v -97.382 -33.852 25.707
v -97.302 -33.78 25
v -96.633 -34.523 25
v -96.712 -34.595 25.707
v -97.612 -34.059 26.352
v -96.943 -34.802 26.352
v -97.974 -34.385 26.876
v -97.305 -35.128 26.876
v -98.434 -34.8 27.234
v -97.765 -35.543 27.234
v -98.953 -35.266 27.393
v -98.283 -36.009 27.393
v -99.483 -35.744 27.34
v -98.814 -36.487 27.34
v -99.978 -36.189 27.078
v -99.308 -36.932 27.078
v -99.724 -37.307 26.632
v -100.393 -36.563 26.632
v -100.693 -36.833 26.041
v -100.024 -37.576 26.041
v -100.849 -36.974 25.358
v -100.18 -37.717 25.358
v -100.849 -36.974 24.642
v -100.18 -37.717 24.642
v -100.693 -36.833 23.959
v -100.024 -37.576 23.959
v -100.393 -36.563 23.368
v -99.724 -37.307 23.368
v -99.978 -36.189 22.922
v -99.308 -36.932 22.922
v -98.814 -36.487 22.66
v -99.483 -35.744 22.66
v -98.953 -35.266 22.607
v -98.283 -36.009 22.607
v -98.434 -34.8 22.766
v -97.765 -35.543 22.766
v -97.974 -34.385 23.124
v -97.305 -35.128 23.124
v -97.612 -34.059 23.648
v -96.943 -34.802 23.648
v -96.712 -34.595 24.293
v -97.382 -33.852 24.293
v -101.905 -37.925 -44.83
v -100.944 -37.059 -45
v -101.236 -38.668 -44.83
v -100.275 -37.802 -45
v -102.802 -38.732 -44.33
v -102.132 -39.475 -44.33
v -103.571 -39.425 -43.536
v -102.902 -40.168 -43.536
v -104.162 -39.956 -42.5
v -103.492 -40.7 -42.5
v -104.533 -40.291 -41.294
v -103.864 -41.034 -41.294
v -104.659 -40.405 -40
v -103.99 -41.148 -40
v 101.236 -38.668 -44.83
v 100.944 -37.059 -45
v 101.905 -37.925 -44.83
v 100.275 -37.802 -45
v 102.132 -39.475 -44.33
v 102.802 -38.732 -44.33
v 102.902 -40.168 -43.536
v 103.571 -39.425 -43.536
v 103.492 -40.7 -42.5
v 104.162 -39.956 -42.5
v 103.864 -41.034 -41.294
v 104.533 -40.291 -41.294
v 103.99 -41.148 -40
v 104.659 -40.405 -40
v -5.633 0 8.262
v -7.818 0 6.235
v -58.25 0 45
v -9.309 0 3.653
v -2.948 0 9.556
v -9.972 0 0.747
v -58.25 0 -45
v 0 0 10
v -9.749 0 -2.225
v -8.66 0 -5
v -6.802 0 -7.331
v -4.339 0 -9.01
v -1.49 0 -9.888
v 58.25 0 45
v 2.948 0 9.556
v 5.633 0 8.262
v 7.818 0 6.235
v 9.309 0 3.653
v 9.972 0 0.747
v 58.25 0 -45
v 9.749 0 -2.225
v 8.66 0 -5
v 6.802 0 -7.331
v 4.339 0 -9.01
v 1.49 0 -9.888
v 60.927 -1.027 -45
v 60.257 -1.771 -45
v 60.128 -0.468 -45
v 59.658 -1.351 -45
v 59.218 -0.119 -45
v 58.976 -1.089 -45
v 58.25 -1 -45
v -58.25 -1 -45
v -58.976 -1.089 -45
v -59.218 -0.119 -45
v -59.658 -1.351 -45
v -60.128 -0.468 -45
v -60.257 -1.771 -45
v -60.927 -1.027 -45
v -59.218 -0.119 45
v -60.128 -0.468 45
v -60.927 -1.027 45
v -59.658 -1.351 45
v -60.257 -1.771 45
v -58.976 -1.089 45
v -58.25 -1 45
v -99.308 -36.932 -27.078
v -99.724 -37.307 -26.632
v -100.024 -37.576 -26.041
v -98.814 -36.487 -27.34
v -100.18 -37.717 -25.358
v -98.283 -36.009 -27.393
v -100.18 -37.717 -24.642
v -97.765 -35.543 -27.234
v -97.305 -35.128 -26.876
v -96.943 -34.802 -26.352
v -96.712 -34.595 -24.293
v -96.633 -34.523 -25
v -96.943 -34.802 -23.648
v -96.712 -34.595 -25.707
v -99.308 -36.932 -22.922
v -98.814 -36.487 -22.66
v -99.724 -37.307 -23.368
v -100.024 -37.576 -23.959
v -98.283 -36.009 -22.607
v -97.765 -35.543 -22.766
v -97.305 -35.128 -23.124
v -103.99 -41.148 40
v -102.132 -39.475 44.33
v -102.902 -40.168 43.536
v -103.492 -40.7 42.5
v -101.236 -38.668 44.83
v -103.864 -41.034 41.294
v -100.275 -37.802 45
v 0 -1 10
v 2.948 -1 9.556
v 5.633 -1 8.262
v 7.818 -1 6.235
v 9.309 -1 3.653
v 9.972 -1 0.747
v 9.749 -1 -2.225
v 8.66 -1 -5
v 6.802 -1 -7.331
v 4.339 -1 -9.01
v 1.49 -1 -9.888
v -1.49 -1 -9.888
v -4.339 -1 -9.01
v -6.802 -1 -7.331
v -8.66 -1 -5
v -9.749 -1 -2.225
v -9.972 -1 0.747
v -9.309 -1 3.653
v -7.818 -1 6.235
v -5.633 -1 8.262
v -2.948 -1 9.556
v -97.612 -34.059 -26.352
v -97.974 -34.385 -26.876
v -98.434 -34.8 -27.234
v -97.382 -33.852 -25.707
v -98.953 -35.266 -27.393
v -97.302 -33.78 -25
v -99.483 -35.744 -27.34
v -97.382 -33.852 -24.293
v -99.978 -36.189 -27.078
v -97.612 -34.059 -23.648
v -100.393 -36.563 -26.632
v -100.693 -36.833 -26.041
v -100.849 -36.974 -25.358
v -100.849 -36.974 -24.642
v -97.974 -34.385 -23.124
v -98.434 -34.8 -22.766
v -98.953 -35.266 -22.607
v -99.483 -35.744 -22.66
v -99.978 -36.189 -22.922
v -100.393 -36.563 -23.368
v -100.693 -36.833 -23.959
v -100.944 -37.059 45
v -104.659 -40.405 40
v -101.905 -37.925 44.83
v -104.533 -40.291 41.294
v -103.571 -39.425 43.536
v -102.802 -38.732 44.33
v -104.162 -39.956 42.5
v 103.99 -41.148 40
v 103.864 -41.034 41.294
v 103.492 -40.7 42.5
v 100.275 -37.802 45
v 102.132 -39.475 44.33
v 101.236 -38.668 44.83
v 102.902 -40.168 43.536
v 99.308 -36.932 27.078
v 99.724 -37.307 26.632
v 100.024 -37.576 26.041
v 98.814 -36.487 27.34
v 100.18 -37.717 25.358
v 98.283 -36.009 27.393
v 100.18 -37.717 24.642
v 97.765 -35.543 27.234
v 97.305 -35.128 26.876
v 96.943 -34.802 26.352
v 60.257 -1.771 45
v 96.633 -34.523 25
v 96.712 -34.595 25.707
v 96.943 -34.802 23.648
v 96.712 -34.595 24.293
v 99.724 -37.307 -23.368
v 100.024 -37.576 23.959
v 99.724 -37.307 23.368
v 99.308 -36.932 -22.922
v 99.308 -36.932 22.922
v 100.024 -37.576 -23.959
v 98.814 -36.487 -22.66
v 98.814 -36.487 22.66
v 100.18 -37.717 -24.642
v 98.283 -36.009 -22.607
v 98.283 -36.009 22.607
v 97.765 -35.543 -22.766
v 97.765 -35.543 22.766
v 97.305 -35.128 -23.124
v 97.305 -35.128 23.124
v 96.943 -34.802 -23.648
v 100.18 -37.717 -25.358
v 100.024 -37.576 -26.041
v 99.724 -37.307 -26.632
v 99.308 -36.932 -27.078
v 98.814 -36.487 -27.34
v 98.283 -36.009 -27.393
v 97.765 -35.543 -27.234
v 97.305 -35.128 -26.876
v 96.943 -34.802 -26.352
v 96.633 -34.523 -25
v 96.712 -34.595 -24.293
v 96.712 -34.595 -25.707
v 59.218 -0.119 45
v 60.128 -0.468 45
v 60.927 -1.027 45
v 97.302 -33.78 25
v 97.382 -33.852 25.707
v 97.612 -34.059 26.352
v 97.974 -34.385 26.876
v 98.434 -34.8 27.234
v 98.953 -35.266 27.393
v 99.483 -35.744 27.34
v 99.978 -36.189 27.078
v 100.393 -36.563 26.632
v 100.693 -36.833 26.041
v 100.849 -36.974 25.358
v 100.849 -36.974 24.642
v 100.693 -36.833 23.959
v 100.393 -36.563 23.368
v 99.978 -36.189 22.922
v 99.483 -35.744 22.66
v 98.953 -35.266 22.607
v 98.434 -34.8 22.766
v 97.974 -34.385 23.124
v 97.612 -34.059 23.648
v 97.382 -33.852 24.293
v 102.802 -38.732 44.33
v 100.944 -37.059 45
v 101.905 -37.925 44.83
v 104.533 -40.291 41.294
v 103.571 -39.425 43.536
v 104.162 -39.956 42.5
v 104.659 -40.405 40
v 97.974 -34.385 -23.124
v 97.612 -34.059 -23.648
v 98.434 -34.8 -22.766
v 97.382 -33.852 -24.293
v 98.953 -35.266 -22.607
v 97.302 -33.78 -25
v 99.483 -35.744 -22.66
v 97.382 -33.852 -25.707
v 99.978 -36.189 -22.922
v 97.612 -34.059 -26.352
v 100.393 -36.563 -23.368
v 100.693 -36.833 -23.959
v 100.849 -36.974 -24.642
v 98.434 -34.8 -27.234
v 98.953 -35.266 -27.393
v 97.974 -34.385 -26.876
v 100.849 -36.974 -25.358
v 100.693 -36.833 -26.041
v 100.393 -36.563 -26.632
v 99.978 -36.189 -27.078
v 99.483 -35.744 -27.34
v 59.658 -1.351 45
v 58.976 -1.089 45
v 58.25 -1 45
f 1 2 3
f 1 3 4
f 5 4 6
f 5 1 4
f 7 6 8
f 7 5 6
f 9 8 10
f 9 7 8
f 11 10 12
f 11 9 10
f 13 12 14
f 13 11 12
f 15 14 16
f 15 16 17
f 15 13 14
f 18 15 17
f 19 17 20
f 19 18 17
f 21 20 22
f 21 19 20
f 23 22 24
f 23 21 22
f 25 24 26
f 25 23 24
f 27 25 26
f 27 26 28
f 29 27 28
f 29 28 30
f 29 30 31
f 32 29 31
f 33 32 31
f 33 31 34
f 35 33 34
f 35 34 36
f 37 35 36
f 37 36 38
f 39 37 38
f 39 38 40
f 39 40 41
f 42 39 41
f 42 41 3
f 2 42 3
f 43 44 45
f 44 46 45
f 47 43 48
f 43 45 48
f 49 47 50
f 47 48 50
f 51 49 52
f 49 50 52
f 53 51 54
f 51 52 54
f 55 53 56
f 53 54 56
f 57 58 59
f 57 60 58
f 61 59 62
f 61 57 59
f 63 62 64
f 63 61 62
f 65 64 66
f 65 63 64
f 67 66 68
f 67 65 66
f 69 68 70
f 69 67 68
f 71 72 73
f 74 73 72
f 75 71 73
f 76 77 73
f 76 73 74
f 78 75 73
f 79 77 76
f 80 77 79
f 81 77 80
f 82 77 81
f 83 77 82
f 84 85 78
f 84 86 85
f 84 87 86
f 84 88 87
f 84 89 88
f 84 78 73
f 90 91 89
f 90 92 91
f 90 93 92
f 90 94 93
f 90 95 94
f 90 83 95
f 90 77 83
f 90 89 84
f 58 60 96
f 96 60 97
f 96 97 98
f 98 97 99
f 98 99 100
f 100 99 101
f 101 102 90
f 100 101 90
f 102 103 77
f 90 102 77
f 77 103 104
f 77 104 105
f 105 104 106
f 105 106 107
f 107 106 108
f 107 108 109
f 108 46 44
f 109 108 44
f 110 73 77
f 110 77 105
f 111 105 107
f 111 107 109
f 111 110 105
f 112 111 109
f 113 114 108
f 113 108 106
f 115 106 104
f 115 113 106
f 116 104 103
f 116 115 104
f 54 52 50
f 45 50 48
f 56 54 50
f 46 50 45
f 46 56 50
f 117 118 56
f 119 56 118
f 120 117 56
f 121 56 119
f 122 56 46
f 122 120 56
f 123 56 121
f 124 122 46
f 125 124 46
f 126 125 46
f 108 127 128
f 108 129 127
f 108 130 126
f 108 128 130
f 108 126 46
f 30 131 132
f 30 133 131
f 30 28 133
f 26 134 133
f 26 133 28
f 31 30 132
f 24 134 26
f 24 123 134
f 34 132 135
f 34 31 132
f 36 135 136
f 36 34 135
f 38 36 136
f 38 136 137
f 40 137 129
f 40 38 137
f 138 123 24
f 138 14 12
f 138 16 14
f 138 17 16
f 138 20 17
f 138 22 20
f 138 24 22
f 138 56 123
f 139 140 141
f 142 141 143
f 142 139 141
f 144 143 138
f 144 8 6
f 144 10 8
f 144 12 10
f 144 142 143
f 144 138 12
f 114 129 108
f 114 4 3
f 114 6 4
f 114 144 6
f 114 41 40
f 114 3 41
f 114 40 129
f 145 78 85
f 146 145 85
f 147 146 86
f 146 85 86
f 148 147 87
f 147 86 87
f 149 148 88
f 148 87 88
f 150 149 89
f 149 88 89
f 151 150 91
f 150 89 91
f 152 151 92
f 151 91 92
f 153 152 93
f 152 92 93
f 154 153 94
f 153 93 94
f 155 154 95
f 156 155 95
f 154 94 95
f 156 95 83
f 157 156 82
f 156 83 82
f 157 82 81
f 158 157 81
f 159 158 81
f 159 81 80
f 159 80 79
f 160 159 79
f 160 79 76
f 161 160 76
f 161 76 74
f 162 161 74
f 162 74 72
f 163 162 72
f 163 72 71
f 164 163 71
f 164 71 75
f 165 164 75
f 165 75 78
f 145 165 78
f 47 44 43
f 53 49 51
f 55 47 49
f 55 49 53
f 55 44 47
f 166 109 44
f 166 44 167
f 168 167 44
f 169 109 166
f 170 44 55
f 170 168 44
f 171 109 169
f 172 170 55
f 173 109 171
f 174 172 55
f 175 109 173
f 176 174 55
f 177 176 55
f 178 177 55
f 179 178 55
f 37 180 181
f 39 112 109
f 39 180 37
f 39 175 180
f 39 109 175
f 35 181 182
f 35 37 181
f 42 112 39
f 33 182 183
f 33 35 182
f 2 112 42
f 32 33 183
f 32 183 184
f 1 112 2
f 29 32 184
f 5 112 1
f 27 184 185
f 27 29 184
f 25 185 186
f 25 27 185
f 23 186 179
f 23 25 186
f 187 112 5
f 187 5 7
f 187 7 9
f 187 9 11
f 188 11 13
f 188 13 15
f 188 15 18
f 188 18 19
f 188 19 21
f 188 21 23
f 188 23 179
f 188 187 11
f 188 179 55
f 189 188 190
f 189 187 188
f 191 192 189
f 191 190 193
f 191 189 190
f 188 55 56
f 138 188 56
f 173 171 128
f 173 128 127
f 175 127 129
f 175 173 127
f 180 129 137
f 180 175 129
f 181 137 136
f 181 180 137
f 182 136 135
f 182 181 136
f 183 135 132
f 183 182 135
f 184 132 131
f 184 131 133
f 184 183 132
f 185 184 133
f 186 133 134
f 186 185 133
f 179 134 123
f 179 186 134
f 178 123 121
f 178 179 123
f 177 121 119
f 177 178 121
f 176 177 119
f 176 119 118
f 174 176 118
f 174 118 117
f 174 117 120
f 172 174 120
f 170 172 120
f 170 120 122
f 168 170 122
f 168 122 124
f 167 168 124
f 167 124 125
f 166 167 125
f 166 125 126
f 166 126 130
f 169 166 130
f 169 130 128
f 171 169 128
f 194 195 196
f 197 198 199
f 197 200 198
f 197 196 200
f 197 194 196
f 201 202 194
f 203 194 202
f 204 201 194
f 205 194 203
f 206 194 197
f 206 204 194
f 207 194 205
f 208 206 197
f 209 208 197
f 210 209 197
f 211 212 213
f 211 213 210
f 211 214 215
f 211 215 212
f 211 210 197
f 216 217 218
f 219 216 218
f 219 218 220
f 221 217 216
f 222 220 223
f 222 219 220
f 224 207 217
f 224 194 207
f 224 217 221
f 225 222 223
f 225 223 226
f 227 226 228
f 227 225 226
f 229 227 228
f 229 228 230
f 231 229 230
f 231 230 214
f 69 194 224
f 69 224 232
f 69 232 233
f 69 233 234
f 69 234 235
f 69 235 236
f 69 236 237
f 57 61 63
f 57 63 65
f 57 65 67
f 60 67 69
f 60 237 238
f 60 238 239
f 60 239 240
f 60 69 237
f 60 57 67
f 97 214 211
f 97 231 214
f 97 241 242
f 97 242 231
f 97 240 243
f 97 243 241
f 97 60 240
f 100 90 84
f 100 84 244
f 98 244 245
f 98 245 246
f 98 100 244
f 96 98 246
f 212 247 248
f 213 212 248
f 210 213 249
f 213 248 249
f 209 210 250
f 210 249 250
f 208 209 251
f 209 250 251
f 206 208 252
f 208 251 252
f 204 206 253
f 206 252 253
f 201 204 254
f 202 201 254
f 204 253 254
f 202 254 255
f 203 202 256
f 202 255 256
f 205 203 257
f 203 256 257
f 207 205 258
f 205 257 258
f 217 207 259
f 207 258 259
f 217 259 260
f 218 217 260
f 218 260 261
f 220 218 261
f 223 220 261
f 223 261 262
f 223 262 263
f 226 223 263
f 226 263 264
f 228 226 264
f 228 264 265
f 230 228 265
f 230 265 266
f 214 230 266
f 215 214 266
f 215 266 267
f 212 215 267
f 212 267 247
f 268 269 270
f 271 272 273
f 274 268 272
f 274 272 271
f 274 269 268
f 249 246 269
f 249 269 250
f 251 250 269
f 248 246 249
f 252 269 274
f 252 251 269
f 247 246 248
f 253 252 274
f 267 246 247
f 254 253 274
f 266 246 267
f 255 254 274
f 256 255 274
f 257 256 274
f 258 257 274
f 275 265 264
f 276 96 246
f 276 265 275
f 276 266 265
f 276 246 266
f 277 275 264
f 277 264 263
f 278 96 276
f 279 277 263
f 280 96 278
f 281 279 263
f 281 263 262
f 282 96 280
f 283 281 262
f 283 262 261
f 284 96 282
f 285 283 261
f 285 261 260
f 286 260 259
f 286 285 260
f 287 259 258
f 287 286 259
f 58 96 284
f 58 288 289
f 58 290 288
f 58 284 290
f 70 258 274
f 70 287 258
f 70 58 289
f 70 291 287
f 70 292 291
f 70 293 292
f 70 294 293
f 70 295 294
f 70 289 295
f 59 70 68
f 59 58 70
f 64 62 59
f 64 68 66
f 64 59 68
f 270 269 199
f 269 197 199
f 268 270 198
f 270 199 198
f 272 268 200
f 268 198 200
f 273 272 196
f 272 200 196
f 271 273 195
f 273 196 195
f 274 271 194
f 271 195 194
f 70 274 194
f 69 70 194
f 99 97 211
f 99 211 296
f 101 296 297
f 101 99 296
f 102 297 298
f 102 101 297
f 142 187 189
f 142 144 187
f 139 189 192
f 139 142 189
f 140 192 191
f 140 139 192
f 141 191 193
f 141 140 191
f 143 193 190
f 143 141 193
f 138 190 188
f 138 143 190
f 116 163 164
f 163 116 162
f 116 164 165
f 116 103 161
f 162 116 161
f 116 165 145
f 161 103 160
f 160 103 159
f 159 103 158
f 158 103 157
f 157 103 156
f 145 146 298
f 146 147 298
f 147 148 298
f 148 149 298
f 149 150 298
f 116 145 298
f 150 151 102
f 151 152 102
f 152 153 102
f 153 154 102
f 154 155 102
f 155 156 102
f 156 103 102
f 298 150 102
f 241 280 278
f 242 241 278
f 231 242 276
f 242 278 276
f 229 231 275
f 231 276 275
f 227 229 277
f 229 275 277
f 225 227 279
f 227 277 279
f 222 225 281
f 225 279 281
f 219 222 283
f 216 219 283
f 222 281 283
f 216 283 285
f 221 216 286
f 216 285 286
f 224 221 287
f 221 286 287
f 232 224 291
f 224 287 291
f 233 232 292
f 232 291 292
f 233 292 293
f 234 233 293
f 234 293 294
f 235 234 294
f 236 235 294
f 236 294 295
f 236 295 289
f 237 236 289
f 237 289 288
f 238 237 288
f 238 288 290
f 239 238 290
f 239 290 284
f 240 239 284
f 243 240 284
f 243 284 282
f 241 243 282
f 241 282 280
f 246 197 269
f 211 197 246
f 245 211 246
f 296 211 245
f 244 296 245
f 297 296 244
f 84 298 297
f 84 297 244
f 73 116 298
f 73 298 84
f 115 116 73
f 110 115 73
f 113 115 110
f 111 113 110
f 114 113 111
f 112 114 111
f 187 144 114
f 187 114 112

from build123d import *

# Parameters (mm, degrees)
ESBO_O1_W                 = 116.5
ESBO_O1_H                 = 90
FLANGE_BASE1_DEPTH        = 1
ARESTA_FLANGE1_DEPTH      = 90
ARESTA_FLANGE1_BEND_DEPTH = 90
CORTE_EXTRUS_O1_REACH     = 157.954
ESBO_O12_R                = 2.4
FILETE1_R                 = 5
CORTE_EXTRUS_O2_REACH     = 123.127
ESBO_O13_R                = 10


# Sheet-metal steps are written as plain solids
with BuildPart() as part:
    # Esboço1 → Flange-base1 (new body)
    with BuildSketch(Plane(origin=(0, 0, 0), x_dir=(1, 0, 0), z_dir=(0, 1, 0))):
        Rectangle(ESBO_O1_W, ESBO_O1_H)
    extrude(amount=-FLANGE_BASE1_DEPTH)

    # Aresta-Flange1 section (across the edge) → Aresta-Flange1 (add)
    with BuildSketch(Plane(origin=(59.401592105, -1, -45), x_dir=(-0.6691306063588541, -0.7431448254773979, 0), z_dir=(0, 0, 1))):
        with BuildLine():
            Line((-1, 1.151592105), (-1, 60))
            Line((-1, 60), (0, 60))
            Line((0, 60), (0, 1.151592105))
            ThreePointArc((0, 1.151592105), (0.199258721, 0.076488256), (0.770565524, -0.855799714))
            Line((0.770565524, -0.855799714), (0.027420698, -1.52493032))
            ThreePointArc((0.027420698, -1.52493032), (-0.734321706, -0.281879693), (-1, 1.151592105))
        make_face()
    extrude(amount=ARESTA_FLANGE1_DEPTH)

    # Aresta-Flange1 section 2 (across the edge) → Aresta-Flange1 bend (add)
    with BuildSketch(Plane(origin=(-59.401592105, -1, 45), x_dir=(0.6691306063588541, -0.7431448254773979, 0), z_dir=(0, 0, -1))):
        with BuildLine():
            Line((-1, 1.151592105), (-1, 60))
            Line((-1, 60), (0, 60))
            Line((0, 60), (0, 1.151592105))
            ThreePointArc((0, 1.151592105), (0.199258721, 0.076488256), (0.770565524, -0.855799714))
            Line((0.770565524, -0.855799714), (0.027420698, -1.52493032))
            ThreePointArc((0.027420698, -1.52493032), (-0.734321706, -0.281879693), (-1, 1.151592105))
        make_face()
    extrude(amount=ARESTA_FLANGE1_BEND_DEPTH)

    # Esboço12 → Corte-extrusão1 (cut, up to next)
    with BuildSketch(Plane(origin=(26.768087142, 29.728972578, 0), x_dir=(0.7431448254773978, -0.6691306063588544, 0), z_dir=(0.6691306063588544, 0.7431448254773978, 0)), mode=Mode.PRIVATE) as corte_extrus_o1_sk1:
        with Locations(Location((97.313116404, -25, 0), (0, 0, 180))):
            Circle(ESBO_O12_R)
    corte_extrus_o1_tool1 = extrude(corte_extrus_o1_sk1.sketch, amount=-CORTE_EXTRUS_O1_REACH, mode=Mode.PRIVATE) & part.part
    # Esboço12 → Corte-extrusão1 (cut, up to next)
    with BuildSketch(Plane(origin=(26.768087142, 29.728972578, 0), x_dir=(0.7431448254773978, -0.6691306063588544, 0), z_dir=(0.6691306063588544, 0.7431448254773978, 0)), mode=Mode.PRIVATE) as corte_extrus_o1_sk2:
        with Locations(Location((97.313116404, 25, 0), (0, 0, 180))):
            Circle(ESBO_O12_R)
    corte_extrus_o1_tool2 = extrude(corte_extrus_o1_sk2.sketch, amount=-CORTE_EXTRUS_O1_REACH, mode=Mode.PRIVATE) & part.part
    corte_extrus_o1_1 = corte_extrus_o1_tool1.solids().sort_by_distance((99.085826, -35.386212, 25))[0]
    add(corte_extrus_o1_1, mode=Mode.SUBTRACT)
    corte_extrus_o1_2 = corte_extrus_o1_tool2.solids().sort_by_distance((99.085826, -35.386212, -25))[0]
    add(corte_extrus_o1_2, mode=Mode.SUBTRACT)
    corte_extrus_o1 = corte_extrus_o1_1 + corte_extrus_o1_2  # Corte-extrusão1 as one shape, for the pattern or mirror that repeats it

    # Espelhar1: Corte-extrusão1 across plane
    add(corte_extrus_o1.mirror(Plane(origin=(0, 0, 0), x_dir=(0, 0, 1), z_dir=(1, 0, 0))), mode=Mode.SUBTRACT)

    # Filete1
    filete1_edges = [part.edges().sort_by_distance(p)[0] for p in [
        (104.324846937, -40.776263969, -45),
        (104.324846937, -40.776263969, 45),
        (-104.324846937, -40.776263969, 45),
        (-104.324846937, -40.776263969, -45),
    ]]
    fillet(filete1_edges, radius=FILETE1_R)

    # Esboço13 → Corte-extrusão2 (cut, up to next)
    with BuildSketch(Plane(origin=(0, 0, 0), x_dir=(1, 0, 0), z_dir=(0, 1, 0)), mode=Mode.PRIVATE) as corte_extrus_o2_sk1:
        with Locations(Location((0, 0, 0), (0, 0, 270))):
            Circle(ESBO_O13_R)
    corte_extrus_o2_tool1 = extrude(corte_extrus_o2_sk1.sketch, amount=-CORTE_EXTRUS_O2_REACH, mode=Mode.PRIVATE) & part.part
    add(corte_extrus_o2_tool1.solids().sort_by_distance((0, 0, 0))[0], mode=Mode.SUBTRACT)


solid = part.part
